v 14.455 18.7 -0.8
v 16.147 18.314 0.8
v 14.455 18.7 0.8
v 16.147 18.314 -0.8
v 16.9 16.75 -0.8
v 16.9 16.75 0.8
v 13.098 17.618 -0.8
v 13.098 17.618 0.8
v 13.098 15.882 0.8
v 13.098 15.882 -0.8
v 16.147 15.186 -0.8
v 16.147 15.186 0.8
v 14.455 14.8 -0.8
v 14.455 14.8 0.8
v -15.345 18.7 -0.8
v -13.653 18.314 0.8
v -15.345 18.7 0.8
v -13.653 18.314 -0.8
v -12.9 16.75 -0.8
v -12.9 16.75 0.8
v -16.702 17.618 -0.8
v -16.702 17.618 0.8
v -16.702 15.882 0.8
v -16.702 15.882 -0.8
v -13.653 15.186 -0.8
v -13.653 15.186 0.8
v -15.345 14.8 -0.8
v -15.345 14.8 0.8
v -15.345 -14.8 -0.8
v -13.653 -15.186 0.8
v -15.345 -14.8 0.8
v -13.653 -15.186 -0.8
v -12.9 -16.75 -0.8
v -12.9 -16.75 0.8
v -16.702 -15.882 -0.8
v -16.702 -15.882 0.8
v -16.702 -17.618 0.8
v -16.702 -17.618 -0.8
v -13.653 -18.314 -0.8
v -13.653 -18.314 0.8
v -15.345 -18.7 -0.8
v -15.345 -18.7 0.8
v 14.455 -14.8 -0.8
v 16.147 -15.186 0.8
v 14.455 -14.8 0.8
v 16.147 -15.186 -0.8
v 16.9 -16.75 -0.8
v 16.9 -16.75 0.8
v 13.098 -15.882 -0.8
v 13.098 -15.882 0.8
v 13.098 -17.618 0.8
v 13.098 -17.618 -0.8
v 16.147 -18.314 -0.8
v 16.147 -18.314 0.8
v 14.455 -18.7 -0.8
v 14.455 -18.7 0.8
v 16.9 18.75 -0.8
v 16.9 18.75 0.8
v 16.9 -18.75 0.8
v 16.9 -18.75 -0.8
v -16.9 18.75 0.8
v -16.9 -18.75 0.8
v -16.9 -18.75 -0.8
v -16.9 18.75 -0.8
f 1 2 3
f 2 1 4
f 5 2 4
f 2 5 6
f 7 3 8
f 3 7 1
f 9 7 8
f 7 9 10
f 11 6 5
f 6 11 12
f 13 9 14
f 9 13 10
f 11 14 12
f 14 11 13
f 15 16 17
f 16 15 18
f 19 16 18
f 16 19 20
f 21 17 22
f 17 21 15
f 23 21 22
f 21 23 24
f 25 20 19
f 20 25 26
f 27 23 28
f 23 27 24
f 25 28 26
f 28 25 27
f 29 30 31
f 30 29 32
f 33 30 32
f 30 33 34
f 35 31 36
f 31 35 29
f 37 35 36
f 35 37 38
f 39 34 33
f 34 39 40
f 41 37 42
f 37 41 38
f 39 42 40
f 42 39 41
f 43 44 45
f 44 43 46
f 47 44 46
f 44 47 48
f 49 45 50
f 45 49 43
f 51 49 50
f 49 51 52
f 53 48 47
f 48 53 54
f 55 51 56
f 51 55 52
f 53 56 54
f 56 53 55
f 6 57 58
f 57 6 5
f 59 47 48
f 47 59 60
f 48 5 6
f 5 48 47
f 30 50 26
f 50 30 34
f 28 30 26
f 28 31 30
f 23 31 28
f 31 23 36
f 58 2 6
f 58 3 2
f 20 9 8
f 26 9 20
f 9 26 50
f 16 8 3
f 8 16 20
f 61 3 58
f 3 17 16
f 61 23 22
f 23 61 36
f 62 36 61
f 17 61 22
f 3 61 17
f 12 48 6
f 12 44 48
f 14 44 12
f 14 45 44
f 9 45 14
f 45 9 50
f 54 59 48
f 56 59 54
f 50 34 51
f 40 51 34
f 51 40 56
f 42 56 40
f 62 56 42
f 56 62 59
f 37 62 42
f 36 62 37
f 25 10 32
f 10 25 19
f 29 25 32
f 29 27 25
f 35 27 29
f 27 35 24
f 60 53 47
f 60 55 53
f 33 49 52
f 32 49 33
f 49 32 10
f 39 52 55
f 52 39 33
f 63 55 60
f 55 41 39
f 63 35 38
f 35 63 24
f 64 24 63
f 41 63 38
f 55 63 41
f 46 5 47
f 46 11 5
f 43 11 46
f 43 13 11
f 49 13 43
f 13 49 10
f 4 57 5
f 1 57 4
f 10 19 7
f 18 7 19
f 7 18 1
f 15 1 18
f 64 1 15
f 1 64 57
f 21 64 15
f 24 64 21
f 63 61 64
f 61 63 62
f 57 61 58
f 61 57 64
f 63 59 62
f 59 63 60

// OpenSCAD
// Parameters
pcb_length = 37.5; //[18.75:75:0.1]
pcb_width = 33.8; //[16.9:67.6:0.1]
pcb_thickness = 1.6; //[0.8:3.2:0.1]
corner_radius = 2.0; //[0:6:0.1]
overlap = 0.8; //[0.2:2.0:0.1]
placeholder_feature_size = 0.2; //[0.05:0.5:0.05]

// Main PCB Body
module pcb_main_body() {
  color([0.0, 0.4, 0.2]) // Green color for PCB
  cube([pcb_width, pcb_length, pcb_thickness], center=true);
}

// Corner Radius Cut Cylinder
module board_corner_radius_cut_cyl() {
  cylinder(r=corner_radius, h=pcb_thickness + 2*overlap, center=true);
}

// Placeholder Features
module placeholder_feature(position) {
  translate(position)
    cube([placeholder_feature_size, placeholder_feature_size, placeholder_feature_size], center=true);
}

// PCB Model with Corner Radius
module pcb_complete_model() {
  difference() {
    pcb_main_body();
    union() {
      translate([pcb_width/2 - corner_radius, pcb_length/2 - corner_radius, 0])
        board_corner_radius_cut_cyl();
      translate([-pcb_width/2 + corner_radius, pcb_length/2 - corner_radius, 0])
        board_corner_radius_cut_cyl();
      translate([-pcb_width/2 + corner_radius, -pcb_length/2 + corner_radius, 0])
        board_corner_radius_cut_cyl();
      translate([pcb_width/2 - corner_radius, -pcb_length/2 + corner_radius, 0])
        board_corner_radius_cut_cyl();
    }
  }
  
  // Adding placeholder features
  union() {
    placeholder_feature([0, 0, pcb_thickness/2 - placeholder_feature_size/2]); // Silkscreen markings
    placeholder_feature([placeholder_feature_size, 0, pcb_thickness/2 - placeholder_feature_size/2]); // Copper pads
    placeholder_feature([0, placeholder_feature_size, pcb_thickness/2 - placeholder_feature_size/2]); // Connectors and components
    placeholder_feature([0, 0, -pcb_thickness/2 + placeholder_feature_size/2]); // Mounting holes
  }
}

// Render the complete PCB model
pcb_complete_model();
